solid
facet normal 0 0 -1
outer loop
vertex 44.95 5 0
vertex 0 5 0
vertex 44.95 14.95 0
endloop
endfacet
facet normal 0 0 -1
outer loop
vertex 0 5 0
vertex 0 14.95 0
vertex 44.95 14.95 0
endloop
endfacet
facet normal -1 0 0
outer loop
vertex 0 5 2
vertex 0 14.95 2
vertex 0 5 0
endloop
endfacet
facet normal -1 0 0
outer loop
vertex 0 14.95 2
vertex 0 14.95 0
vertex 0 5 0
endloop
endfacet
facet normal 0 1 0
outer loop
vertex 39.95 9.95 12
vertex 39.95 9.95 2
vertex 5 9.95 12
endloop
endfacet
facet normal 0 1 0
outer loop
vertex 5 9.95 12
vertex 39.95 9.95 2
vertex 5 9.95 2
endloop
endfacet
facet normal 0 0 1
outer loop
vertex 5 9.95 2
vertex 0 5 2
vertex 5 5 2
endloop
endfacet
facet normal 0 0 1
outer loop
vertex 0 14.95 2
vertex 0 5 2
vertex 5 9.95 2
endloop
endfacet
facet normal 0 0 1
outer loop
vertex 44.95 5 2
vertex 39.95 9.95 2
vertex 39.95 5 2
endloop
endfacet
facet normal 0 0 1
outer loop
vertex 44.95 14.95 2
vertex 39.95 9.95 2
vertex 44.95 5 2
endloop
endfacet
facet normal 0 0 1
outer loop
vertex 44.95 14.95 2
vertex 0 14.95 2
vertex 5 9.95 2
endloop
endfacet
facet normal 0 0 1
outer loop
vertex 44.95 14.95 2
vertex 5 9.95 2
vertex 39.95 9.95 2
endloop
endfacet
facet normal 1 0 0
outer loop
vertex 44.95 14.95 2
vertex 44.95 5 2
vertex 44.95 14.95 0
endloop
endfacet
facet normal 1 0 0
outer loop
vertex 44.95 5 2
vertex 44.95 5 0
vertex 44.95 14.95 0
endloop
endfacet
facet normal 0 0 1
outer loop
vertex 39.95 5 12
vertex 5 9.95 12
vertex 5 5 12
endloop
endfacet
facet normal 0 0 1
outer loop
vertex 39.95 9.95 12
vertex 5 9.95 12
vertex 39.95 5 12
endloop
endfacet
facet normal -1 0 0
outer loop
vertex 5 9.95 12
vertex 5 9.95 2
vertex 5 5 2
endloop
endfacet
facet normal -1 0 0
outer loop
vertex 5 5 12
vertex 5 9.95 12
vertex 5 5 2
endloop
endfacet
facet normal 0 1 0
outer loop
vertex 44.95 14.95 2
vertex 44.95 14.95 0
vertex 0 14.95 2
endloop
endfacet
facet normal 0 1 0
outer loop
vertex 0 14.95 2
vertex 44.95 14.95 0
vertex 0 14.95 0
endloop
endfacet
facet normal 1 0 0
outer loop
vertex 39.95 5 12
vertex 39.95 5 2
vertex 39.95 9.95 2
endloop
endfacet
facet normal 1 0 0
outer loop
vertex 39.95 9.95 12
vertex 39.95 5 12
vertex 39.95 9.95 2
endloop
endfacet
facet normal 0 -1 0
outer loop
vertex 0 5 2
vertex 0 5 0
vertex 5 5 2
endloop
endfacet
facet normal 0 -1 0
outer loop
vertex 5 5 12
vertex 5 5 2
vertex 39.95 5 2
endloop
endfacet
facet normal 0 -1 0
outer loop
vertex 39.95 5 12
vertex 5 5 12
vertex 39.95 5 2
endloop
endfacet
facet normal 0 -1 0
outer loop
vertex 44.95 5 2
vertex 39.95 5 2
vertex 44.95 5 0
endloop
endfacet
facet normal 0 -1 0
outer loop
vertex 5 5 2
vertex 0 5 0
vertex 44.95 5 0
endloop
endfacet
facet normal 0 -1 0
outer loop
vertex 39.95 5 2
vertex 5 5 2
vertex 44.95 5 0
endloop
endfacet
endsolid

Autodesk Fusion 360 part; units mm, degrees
sketch "Sketch1" plane through (0, 0, 0) normal (0, 0, 1) x (1, 0, 0)
  line L0 (0, 0) -> (44.95, 0)
  line L1 (44.95, 0) -> (44.95, 14.95)
  line L2 (44.95, 14.95) -> (0, 14.95)
  line L3 (0, 14.95) -> (0, 0)
  line L4 (5, 5) -> (39.95, 5)
  line L5 (39.95, 5) -> (39.95, 9.95)
  line L6 (39.95, 9.95) -> (5, 9.95)
  line L7 (5, 9.95) -> (5, 5)
  dimension "d1" = 44.95
  dimension "d2" = 14.95
  dimension "d3" = 34.95
  dimension "d4" = 4.95
  dimension "d5" = 5
  dimension "d6" = 5
extrude "Extrude1" add sketch "Sketch1" along normal blind 12 contours L4 L5 L6 L7
extrude "Extrude2" add sketch "Sketch1" along normal blind 2
sketch "Sketch2" plane through (0, 0, 2) normal (0, 0, 1) x (-1, 0, 0)
  line L0 (-5, -5) -> (-5, -9.95)
  line L1 (-5, -9.95) -> (-39.95, -9.95)
  line L2 (-39.95, -9.95) -> (-39.95, -5)
  line L3 (-39.95, -5) -> (-5, -5)
  line L4 (0, -14.95) -> (0, 0)
  line L5 (0, 0) -> (-44.95, 0)
  line L6 (-44.95, 0) -> (-44.95, -14.95)
  line L7 (-44.95, -14.95) -> (0, -14.95)
  line L8 (-44.95, 0) -> (0, 0)
  line L9 (0, 0) -> (0, -5)
  line L10 (0, -5) -> (-44.95, -5)
  line L11 (-44.95, -5) -> (-44.95, 0)
extrude "Extrude3" cut sketch "Sketch2" against normal blind 4 contours L3 L4 L5 L6 L8 L9 L10 L11
